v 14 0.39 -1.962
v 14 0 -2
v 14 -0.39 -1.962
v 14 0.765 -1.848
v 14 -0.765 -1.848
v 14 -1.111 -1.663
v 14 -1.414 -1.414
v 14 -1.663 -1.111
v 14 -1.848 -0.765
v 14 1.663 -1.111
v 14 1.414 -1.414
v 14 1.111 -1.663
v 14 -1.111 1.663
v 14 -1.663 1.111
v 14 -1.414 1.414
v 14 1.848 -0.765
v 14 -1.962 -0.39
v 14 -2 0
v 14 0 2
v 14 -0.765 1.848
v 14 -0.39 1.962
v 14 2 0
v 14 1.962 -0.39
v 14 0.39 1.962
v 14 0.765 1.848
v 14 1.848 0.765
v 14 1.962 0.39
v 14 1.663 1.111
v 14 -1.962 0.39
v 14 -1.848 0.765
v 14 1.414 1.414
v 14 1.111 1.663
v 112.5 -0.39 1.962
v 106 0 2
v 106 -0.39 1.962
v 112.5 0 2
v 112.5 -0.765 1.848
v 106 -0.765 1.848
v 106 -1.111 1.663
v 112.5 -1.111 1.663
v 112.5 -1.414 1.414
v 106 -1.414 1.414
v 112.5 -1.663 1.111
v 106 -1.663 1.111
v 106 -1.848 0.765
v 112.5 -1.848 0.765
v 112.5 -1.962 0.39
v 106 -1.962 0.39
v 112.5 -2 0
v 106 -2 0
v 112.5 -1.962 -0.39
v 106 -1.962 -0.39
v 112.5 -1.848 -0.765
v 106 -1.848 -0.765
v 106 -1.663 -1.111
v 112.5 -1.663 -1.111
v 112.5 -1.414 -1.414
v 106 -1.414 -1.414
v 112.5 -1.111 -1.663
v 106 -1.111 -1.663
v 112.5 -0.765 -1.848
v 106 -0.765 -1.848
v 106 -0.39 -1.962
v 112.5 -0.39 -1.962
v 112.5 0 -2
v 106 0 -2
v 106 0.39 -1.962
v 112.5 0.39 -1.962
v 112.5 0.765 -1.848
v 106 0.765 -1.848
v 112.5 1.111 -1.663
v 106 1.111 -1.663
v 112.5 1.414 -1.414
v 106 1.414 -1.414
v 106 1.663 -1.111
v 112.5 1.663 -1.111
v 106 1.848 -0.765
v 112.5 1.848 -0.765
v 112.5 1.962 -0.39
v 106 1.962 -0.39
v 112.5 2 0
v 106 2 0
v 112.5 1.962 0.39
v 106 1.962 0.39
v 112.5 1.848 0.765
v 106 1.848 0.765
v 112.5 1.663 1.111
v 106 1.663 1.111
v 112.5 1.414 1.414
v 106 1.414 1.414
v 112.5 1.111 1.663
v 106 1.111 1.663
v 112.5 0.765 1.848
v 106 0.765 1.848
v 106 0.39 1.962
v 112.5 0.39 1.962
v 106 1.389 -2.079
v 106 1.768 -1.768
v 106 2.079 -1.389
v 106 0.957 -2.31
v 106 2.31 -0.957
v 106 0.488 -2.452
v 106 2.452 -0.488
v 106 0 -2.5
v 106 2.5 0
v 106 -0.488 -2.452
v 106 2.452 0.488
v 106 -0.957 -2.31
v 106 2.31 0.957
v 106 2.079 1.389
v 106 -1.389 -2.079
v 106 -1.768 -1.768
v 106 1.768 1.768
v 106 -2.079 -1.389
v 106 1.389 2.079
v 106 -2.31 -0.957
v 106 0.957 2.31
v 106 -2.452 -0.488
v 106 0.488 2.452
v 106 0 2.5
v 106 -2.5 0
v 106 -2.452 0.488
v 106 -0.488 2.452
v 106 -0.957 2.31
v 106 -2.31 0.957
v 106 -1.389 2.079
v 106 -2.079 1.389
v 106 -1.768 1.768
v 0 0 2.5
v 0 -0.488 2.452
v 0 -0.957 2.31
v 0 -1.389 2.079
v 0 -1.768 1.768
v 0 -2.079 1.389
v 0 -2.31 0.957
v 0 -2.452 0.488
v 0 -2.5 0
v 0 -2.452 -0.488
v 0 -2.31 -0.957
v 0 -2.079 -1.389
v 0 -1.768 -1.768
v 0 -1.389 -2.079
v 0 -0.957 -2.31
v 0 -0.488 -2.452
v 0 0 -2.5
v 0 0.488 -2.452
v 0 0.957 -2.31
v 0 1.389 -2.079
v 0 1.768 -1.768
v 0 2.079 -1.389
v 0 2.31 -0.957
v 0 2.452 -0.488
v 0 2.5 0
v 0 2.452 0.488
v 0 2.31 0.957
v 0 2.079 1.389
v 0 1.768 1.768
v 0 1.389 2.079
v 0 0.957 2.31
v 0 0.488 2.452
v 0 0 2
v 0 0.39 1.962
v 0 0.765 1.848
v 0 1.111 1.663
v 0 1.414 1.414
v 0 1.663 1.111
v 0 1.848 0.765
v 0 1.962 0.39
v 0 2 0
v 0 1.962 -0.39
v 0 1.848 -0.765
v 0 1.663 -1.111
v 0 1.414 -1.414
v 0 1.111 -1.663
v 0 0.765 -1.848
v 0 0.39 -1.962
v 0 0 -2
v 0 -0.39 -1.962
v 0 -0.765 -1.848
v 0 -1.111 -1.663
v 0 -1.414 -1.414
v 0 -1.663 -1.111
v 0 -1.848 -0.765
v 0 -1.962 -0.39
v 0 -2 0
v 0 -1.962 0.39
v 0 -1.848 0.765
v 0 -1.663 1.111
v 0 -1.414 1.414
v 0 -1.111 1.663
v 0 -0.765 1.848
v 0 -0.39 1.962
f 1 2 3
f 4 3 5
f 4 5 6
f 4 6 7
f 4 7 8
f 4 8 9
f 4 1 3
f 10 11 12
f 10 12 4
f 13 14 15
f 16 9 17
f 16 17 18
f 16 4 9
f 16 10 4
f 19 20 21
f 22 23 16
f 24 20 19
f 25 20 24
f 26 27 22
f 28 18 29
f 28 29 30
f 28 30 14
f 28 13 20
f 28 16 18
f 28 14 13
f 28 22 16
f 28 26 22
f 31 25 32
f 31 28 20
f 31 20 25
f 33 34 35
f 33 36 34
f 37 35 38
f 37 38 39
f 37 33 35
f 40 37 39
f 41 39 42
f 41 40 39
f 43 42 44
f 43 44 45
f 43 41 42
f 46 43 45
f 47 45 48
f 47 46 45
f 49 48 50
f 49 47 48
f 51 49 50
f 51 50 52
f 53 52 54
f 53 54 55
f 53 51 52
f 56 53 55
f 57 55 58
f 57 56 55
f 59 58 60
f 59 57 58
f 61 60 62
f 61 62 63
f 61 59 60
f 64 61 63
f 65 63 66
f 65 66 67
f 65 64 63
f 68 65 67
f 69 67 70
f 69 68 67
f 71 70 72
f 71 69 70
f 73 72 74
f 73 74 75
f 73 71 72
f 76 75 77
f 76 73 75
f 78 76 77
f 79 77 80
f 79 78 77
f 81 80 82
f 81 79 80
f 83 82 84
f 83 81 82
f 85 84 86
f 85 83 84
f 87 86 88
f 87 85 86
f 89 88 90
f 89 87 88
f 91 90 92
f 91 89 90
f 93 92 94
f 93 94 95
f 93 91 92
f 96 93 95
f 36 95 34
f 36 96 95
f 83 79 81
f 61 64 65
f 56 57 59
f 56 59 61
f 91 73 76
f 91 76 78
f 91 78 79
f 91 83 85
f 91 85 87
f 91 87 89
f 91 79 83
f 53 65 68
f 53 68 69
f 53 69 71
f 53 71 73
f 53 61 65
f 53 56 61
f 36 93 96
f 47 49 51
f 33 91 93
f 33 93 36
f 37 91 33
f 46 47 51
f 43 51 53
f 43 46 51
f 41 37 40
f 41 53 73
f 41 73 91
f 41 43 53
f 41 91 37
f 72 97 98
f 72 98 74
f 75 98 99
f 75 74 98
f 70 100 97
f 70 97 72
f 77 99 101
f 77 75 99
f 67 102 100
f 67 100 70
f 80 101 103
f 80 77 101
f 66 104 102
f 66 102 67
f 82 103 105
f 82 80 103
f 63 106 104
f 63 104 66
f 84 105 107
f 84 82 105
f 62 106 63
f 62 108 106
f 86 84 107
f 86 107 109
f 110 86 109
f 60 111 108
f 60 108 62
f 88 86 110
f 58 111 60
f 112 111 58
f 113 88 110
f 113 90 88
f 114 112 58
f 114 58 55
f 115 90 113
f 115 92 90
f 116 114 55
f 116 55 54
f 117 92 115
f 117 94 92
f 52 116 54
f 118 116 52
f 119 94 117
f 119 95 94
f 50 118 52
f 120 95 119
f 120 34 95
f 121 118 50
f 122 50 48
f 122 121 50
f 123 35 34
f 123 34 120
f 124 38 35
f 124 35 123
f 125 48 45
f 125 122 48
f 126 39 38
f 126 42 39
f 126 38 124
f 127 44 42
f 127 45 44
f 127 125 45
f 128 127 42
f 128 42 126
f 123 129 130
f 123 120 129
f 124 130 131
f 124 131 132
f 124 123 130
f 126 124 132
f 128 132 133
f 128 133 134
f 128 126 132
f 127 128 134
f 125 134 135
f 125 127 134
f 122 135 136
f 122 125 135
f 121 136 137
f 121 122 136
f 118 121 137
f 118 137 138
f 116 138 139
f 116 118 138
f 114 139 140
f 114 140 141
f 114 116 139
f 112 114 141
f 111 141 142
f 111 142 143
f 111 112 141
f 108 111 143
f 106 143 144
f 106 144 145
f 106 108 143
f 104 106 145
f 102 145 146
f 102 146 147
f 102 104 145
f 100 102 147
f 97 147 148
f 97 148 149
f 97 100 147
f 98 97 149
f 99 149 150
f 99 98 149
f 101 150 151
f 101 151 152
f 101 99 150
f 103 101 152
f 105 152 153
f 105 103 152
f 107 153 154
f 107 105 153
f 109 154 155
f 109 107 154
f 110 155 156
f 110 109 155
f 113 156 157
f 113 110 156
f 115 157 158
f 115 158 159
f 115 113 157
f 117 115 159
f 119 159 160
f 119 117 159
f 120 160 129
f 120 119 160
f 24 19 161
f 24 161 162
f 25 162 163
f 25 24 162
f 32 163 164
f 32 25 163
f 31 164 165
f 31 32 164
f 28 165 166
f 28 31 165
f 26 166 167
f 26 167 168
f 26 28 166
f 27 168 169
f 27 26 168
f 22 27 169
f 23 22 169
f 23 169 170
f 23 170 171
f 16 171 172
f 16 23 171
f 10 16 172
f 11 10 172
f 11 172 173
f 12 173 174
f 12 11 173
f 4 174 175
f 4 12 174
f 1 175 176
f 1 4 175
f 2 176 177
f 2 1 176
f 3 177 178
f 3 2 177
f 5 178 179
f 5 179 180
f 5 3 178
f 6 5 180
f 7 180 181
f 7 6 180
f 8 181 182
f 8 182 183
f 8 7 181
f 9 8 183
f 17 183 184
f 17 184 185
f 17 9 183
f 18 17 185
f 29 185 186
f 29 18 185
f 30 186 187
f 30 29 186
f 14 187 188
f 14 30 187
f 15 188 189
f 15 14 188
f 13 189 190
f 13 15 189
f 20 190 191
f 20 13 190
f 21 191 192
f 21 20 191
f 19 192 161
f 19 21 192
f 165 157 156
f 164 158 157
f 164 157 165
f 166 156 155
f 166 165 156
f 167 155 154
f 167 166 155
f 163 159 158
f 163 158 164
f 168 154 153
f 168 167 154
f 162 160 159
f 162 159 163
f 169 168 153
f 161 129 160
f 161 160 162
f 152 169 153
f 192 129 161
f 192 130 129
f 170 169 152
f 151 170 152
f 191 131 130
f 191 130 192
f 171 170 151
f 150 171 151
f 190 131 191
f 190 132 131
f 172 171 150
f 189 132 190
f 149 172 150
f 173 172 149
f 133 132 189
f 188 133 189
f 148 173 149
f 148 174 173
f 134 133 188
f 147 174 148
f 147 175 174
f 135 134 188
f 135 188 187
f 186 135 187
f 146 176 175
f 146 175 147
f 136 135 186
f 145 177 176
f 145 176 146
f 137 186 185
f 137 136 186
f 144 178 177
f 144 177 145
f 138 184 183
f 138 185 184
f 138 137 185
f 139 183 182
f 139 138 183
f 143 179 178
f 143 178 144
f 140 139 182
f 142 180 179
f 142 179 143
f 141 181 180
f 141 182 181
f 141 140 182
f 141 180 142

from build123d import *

# Parameters (mm, degrees)
CUT_EXTRUDE1_START = -14
SKETCH2_R          = 2
CUT_EXTRUDE1_DEPTH = 14


with BuildPart() as part:
    # Sketch1 → Revolve1 (revolve)
    with BuildSketch(Plane.XY, mode=Mode.PRIVATE) as revolve1_sk:
        Polygon((0, 0), (0, 2.5), (106, 2.5), (106, 2), (112.5, 2), (112.5, 0), align=None)
    revolve(revolve1_sk.sketch.rotate(Axis((0, 0, 0), (1, 0, 0)), 90), axis=Axis((0, 0, 0), (1, 0, 0)))

    # Sketch2 → Cut-Extrude1 (cut)
    with BuildSketch(Plane.ZY.offset(CUT_EXTRUDE1_START)):
        Circle(SKETCH2_R)
    extrude(amount=CUT_EXTRUDE1_DEPTH, mode=Mode.SUBTRACT)


solid = part.part
